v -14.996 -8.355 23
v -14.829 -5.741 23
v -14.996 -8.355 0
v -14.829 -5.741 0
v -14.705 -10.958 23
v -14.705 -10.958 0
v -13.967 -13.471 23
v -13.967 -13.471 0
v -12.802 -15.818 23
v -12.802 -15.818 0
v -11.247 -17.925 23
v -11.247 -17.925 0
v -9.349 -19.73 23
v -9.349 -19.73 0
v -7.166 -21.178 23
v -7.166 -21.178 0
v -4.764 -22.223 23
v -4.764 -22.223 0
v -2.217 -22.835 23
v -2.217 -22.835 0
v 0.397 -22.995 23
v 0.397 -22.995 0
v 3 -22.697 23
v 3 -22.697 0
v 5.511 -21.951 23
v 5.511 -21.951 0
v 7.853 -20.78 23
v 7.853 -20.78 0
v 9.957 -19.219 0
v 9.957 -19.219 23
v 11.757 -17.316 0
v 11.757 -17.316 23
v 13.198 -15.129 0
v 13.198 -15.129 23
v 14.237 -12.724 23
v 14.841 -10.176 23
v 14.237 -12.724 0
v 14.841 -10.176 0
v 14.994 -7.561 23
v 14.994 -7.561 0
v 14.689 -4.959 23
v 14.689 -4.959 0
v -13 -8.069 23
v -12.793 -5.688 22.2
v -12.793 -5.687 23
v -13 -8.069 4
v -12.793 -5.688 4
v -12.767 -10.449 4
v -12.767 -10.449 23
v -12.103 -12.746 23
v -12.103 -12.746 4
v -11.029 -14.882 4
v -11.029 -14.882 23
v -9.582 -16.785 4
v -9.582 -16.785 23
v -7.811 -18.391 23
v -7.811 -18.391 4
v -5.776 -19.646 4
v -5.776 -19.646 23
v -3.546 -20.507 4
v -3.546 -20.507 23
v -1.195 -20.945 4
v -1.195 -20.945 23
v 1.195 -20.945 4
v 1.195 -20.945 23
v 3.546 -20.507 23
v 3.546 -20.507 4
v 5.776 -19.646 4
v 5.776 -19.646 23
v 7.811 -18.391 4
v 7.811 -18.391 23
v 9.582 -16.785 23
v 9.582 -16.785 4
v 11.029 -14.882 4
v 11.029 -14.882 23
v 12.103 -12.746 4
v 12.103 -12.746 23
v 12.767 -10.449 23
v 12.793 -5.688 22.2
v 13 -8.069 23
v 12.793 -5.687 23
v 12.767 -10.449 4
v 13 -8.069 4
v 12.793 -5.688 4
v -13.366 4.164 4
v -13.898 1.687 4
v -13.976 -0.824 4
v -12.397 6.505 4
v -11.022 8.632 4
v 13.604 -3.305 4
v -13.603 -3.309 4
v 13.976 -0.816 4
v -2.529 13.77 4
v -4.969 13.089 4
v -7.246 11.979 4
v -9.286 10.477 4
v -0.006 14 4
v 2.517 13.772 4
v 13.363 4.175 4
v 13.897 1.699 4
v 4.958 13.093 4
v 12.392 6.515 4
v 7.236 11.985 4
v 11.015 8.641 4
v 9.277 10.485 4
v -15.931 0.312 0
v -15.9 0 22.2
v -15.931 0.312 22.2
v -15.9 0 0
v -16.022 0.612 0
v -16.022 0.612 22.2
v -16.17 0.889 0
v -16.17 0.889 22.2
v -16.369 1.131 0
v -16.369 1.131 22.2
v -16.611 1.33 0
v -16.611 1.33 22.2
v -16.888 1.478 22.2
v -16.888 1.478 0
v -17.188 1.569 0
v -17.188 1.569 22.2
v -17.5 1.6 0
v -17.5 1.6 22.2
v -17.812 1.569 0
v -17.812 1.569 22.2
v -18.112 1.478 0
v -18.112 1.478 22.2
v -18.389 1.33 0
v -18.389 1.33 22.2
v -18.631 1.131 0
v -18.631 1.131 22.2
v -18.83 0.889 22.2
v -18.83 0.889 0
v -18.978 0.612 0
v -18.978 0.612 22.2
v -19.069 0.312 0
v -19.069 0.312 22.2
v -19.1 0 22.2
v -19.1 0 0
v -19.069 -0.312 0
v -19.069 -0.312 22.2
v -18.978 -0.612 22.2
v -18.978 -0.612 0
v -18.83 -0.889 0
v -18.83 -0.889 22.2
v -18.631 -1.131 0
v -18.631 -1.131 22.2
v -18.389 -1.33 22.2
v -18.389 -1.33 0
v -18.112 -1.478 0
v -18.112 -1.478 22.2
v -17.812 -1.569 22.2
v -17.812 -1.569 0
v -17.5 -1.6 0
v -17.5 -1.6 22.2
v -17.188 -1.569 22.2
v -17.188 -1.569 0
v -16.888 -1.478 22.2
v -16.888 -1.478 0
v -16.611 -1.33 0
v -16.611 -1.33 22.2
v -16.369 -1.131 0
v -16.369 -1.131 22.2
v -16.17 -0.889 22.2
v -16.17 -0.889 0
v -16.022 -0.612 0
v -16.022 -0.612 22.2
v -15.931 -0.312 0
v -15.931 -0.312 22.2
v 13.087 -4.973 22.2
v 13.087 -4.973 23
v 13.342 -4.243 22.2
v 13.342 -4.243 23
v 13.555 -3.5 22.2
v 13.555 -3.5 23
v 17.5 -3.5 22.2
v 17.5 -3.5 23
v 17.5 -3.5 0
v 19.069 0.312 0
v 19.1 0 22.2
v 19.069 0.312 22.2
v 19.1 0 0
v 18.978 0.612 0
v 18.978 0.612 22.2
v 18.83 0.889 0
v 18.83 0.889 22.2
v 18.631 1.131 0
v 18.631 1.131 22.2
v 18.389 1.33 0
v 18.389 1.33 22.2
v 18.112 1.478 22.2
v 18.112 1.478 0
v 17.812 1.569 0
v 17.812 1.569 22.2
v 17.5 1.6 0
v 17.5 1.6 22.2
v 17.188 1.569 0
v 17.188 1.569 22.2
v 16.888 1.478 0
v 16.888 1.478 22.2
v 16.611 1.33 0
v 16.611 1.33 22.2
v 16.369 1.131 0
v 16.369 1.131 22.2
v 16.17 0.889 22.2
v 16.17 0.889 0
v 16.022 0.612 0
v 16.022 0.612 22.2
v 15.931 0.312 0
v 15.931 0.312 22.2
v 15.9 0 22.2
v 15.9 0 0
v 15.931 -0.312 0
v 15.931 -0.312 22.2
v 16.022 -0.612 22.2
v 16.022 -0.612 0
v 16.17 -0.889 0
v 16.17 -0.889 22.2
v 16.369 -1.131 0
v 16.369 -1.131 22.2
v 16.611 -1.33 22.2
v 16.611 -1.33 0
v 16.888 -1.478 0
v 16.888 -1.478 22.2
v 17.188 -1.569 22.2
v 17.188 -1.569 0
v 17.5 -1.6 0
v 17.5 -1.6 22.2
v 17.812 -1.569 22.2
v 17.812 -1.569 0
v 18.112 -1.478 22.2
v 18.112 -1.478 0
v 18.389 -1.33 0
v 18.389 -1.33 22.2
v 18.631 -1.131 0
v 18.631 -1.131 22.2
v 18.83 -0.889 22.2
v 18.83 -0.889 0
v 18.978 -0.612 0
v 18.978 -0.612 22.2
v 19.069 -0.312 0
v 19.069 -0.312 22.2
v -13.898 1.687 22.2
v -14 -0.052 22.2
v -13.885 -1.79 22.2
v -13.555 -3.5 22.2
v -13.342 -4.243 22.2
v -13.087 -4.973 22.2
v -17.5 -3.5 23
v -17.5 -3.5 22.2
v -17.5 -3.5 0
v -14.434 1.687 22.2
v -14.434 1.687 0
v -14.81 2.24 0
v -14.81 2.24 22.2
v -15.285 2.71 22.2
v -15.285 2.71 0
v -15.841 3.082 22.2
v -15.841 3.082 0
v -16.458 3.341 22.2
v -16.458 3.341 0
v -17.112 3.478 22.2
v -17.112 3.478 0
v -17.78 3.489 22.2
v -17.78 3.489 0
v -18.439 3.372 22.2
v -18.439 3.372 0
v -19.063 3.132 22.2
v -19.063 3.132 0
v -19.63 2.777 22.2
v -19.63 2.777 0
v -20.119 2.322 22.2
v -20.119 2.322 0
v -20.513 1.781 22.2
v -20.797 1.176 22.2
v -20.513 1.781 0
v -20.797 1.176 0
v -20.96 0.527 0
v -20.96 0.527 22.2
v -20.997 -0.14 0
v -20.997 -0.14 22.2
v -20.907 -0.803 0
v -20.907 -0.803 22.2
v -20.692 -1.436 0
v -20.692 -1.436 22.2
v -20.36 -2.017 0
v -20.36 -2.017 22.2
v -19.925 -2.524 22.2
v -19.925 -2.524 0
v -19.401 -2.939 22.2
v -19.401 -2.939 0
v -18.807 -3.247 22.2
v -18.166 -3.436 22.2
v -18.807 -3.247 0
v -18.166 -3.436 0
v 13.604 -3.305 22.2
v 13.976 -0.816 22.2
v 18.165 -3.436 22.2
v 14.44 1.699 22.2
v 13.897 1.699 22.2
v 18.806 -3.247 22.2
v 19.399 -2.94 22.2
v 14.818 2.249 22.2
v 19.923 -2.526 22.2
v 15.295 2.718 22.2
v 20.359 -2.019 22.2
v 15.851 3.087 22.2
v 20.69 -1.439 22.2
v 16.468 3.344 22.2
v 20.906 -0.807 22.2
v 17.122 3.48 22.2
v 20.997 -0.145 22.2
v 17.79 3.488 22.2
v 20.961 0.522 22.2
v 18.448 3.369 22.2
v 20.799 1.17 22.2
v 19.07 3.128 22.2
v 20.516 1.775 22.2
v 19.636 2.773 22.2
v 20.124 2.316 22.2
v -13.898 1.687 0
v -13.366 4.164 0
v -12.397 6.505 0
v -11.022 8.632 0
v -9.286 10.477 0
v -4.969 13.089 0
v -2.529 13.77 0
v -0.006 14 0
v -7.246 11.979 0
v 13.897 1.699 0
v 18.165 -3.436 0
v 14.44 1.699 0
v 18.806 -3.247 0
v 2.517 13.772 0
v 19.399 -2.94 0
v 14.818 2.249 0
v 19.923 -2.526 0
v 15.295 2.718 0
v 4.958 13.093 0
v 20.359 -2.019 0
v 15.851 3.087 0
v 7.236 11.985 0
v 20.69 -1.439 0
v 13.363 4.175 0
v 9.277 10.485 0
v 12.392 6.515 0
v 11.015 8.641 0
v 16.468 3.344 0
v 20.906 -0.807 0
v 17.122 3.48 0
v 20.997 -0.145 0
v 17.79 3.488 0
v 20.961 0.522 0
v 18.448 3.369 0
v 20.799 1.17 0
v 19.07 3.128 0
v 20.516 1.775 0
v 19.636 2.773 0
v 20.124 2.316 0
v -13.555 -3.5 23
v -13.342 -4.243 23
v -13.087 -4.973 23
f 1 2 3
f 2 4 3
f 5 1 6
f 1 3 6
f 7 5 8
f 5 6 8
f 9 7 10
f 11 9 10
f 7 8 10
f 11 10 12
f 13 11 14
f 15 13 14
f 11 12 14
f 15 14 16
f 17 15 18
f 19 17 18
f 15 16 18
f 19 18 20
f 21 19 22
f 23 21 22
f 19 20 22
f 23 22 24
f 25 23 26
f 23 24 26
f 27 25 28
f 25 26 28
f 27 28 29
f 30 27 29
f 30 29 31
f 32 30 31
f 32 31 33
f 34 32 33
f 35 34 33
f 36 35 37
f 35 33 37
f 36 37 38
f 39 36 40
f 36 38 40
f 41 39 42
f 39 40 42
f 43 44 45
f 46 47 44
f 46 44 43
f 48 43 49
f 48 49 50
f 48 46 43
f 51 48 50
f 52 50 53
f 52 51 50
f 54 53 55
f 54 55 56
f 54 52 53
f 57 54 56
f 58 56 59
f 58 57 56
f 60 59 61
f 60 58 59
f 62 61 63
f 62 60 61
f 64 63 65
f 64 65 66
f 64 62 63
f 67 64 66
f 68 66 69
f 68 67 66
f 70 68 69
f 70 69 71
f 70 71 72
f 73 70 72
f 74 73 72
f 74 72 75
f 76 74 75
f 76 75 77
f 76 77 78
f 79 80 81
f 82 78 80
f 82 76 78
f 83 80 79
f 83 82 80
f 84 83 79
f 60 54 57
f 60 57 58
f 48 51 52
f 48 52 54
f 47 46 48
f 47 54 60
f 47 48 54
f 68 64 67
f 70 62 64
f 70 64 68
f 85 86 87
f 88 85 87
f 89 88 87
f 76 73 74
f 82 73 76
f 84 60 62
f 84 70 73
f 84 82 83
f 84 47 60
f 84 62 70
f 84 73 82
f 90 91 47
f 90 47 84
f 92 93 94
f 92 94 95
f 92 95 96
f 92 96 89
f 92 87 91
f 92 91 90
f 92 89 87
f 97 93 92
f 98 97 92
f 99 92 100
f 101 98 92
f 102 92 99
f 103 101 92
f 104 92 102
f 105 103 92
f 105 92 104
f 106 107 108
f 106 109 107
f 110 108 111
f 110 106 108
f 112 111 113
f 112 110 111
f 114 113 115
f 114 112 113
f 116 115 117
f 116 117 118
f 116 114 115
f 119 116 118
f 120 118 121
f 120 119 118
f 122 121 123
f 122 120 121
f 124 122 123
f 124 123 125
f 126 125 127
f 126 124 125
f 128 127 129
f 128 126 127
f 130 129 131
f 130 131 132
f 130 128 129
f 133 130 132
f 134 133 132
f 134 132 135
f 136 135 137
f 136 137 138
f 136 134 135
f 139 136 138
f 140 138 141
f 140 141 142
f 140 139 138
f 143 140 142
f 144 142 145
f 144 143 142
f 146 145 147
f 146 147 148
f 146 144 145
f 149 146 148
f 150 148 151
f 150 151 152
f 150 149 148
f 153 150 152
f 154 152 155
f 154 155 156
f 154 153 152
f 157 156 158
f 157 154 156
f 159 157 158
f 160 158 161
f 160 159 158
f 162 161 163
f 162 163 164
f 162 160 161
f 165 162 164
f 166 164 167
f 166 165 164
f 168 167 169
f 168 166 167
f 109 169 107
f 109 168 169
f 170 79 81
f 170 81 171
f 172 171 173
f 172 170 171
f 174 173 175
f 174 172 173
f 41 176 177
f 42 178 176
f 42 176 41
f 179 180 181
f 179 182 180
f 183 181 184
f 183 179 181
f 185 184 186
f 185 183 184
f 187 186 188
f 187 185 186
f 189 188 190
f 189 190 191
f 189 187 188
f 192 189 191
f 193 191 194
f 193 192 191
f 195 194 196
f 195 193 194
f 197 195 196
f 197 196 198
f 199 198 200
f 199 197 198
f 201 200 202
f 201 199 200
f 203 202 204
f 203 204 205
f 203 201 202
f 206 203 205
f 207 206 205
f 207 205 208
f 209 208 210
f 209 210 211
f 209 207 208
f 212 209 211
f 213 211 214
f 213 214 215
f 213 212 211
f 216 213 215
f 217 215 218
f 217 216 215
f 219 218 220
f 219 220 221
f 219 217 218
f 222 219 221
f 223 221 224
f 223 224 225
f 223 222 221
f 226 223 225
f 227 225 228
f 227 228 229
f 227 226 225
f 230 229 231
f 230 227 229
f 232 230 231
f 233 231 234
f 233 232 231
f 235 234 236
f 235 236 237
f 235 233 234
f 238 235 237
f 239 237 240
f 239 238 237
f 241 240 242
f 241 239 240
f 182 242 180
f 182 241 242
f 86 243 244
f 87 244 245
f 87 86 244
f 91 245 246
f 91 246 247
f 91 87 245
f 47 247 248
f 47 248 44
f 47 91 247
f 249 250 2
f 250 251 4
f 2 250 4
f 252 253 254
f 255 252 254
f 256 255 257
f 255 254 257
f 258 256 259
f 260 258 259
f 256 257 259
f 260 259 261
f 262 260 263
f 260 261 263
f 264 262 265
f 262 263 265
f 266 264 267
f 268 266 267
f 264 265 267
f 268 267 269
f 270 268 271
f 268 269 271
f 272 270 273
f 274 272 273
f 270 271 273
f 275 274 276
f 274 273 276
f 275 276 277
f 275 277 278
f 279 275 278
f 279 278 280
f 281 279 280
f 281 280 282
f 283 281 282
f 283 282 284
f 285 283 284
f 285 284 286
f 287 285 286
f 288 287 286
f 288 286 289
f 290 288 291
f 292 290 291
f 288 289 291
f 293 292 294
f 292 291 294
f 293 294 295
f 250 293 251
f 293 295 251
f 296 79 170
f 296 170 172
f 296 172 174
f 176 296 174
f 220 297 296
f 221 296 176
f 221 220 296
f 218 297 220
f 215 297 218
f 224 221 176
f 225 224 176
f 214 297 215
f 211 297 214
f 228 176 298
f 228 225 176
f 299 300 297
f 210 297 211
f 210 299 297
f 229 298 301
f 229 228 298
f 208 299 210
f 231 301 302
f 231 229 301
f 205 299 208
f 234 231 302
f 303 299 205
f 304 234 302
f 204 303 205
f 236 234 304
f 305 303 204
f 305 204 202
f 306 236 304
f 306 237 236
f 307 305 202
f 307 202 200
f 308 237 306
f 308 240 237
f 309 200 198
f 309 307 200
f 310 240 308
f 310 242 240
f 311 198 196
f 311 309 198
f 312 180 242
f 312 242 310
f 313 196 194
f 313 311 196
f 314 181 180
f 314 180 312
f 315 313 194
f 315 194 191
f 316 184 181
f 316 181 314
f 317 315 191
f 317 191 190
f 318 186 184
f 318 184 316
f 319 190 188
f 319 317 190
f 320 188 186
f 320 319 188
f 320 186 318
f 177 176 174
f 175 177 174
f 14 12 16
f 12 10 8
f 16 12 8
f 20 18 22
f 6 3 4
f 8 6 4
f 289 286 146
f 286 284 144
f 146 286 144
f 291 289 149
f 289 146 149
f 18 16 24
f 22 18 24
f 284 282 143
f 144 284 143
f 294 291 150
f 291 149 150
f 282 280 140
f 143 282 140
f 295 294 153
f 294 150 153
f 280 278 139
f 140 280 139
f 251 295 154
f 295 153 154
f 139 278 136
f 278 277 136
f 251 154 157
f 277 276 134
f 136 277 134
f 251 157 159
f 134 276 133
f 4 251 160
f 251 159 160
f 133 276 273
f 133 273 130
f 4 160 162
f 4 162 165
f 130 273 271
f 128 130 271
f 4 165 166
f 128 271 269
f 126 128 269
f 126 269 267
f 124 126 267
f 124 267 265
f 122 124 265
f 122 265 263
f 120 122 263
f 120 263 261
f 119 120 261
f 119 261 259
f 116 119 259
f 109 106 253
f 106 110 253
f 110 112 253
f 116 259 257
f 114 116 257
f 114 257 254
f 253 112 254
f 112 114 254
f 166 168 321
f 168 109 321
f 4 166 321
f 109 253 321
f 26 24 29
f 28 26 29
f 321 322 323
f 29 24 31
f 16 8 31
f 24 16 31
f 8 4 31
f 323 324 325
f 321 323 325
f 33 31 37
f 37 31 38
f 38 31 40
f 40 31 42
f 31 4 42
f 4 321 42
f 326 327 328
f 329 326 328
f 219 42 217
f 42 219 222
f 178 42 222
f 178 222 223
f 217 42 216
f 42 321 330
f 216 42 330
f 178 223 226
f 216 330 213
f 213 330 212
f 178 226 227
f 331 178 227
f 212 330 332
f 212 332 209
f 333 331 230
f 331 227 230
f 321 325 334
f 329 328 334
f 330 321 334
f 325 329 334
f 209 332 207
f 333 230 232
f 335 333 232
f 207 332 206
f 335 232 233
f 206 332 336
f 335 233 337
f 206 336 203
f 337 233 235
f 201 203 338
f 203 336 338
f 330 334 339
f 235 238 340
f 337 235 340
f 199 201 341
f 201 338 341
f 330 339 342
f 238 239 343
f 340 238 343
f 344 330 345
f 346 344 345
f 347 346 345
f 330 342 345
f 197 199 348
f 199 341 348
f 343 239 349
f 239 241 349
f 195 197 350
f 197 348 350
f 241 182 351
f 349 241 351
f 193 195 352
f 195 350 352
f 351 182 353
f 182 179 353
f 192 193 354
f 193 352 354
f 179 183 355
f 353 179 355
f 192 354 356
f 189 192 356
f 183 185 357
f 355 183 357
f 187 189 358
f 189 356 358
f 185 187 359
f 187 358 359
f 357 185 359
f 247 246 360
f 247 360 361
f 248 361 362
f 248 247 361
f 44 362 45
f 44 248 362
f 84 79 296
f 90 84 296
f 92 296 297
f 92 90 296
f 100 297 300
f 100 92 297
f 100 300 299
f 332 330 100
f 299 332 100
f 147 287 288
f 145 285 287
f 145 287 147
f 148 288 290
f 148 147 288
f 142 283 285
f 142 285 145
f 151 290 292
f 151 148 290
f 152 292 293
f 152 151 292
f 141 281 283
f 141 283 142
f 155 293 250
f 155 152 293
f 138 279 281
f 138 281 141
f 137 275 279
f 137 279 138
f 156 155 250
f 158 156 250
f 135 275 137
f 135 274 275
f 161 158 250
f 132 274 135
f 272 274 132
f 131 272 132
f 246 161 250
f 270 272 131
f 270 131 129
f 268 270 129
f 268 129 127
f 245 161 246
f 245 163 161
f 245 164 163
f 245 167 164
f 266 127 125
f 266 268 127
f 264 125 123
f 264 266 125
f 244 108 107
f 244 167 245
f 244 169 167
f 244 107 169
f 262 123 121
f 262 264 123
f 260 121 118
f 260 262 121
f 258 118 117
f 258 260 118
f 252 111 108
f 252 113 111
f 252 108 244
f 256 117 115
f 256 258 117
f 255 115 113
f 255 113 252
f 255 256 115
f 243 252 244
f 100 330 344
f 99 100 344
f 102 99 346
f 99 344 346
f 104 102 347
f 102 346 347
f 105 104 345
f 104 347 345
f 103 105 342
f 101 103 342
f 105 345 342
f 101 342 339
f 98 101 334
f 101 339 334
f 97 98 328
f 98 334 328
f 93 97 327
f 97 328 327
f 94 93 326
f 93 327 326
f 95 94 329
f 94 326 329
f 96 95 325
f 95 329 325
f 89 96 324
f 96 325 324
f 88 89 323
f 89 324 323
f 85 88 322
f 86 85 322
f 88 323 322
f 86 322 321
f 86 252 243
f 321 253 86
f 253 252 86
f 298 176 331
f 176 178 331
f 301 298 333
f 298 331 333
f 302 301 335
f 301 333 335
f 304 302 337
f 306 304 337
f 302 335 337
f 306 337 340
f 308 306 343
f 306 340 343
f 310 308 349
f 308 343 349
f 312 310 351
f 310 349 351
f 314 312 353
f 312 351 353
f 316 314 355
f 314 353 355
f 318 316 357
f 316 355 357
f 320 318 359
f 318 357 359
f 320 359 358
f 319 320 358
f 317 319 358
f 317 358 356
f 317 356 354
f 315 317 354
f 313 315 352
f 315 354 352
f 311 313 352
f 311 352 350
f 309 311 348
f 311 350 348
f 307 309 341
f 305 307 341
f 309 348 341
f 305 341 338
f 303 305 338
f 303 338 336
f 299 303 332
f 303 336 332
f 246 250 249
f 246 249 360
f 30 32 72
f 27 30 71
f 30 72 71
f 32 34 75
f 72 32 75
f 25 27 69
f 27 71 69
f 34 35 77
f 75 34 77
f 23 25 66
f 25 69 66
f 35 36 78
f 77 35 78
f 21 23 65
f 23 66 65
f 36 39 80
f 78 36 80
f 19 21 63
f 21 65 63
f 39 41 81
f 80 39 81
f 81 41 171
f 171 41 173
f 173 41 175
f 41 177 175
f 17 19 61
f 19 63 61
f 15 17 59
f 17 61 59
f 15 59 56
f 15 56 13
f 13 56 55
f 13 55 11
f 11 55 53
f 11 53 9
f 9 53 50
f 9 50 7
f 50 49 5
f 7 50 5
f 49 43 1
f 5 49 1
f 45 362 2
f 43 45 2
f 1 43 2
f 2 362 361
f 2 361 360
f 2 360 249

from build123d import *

# Parameters (mm, degrees)
SKETCH_R     = 1.6
PAD_DEPTH    = 4
SKETCH002_R  = 1.6
PAD001_DEPTH = 18.2
PAD002_DEPTH = 0.8


with BuildPart() as part:
    # Sketch → Pad (new body)
    with BuildSketch(Plane.XY):
        with BuildLine():
            ThreePointArc((-14.43353, 1.687235), (-20.512916, 1.781106), (-17.5, -3.5))
            Line((-17.5, -3.5), (-14.828962, -5.741267))
            ThreePointArc((-14.828962, -5.741267), (0.397332, -22.994737), (14.688532, -4.959109))
            Line((14.688532, -4.959109), (17.5, -3.5))
            ThreePointArc((17.5, -3.5), (20.51628, 1.775403), (14.439936, 1.698825))
            Line((13.896546, 1.698825), (14.439936, 1.698825))
            ThreePointArc((13.896546, 1.698825), (-0.005838, 13.999999), (-13.897958, 1.687235))
            Line((-14.43353, 1.687235), (-13.897958, 1.687235))
        make_face()
        with Locations((-17.5, 0)):
            Circle(SKETCH_R, mode=Mode.SUBTRACT)
        with Locations((17.5, 0)):
            Circle(SKETCH_R, mode=Mode.SUBTRACT)
    extrude(amount=PAD_DEPTH)

    # Sketch002 (on Face12 of Pad) → Pad001 (join)
    with BuildSketch(Plane.XY.offset(4)):
        with BuildLine():
            ThreePointArc((-14.43353, 1.687235), (-20.512916, 1.781106), (-17.5, -3.5))
            Line((-17.5, -3.5), (-14.828962, -5.741267))
            ThreePointArc((-14.828962, -5.741267), (0.397332, -22.994737), (14.688532, -4.959109))
            Line((14.688532, -4.959109), (17.5, -3.5))
            ThreePointArc((17.5, -3.5), (20.51628, 1.775403), (14.439936, 1.698825))
            Line((13.896546, 1.698825), (14.439936, 1.698825))
            ThreePointArc((12.792668, -5.6875), (13.846226, -2.069304), (13.896546, 1.698825))
            ThreePointArc((-12.792668, -5.6875), (0, -21), (12.792668, -5.6875))
            ThreePointArc((-13.897958, 1.687235), (-13.845362, -2.075078), (-12.792668, -5.6875))
            Line((-14.43353, 1.687235), (-13.897958, 1.687235))
        make_face()
        with Locations((-17.5, 0)):
            Circle(SKETCH002_R, mode=Mode.SUBTRACT)
        with Locations((17.5, 0)):
            Circle(SKETCH002_R, mode=Mode.SUBTRACT)
    extrude(amount=PAD001_DEPTH)

    # Sketch003 (on Face15 of Pad001) → Pad002 (join)
    with BuildSketch(Plane.XY.offset(22.2)):
        with BuildLine():
            Line((-17.5, -3.5), (-13.555442, -3.5))
            ThreePointArc((-13.555442, -3.5), (-13.21938, -4.609555), (-12.792668, -5.6875))
            ThreePointArc((-12.792668, -5.6875), (0, -21), (12.792668, -5.6875))
            ThreePointArc((12.792668, -5.6875), (13.21938, -4.609555), (13.555442, -3.5))
            Line((17.5, -3.5), (13.555442, -3.5))
            Line((17.5, -3.5), (14.688532, -4.959109))
            ThreePointArc((-14.828962, -5.741267), (0.397332, -22.994737), (14.688532, -4.959109))
            Line((-17.5, -3.5), (-14.828962, -5.741267))
        make_face()
    extrude(amount=PAD002_DEPTH)


solid = part.part
